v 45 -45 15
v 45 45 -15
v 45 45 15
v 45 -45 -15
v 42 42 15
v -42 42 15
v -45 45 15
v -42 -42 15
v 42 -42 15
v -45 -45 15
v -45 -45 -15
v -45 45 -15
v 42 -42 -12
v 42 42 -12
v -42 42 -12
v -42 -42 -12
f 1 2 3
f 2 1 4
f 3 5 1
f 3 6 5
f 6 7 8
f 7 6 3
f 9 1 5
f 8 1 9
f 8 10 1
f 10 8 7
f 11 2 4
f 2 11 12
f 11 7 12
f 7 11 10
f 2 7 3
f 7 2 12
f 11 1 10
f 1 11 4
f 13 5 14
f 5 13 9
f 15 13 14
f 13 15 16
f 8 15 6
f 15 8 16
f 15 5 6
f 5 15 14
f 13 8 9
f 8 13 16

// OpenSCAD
// ========================================
// a 9 x 9 x 3 cm enclosure with 0.3 cm wall thickness
// NeuroCAD canonical IR; dimensions are millimetres
// ========================================
$fn = 48;

difference() {
  cube(size=[90, 90, 30], center=true);
  translate([0, 0, 1.6]) {
    cube(size=[84, 84, 27.2], center=true);
  }
}
